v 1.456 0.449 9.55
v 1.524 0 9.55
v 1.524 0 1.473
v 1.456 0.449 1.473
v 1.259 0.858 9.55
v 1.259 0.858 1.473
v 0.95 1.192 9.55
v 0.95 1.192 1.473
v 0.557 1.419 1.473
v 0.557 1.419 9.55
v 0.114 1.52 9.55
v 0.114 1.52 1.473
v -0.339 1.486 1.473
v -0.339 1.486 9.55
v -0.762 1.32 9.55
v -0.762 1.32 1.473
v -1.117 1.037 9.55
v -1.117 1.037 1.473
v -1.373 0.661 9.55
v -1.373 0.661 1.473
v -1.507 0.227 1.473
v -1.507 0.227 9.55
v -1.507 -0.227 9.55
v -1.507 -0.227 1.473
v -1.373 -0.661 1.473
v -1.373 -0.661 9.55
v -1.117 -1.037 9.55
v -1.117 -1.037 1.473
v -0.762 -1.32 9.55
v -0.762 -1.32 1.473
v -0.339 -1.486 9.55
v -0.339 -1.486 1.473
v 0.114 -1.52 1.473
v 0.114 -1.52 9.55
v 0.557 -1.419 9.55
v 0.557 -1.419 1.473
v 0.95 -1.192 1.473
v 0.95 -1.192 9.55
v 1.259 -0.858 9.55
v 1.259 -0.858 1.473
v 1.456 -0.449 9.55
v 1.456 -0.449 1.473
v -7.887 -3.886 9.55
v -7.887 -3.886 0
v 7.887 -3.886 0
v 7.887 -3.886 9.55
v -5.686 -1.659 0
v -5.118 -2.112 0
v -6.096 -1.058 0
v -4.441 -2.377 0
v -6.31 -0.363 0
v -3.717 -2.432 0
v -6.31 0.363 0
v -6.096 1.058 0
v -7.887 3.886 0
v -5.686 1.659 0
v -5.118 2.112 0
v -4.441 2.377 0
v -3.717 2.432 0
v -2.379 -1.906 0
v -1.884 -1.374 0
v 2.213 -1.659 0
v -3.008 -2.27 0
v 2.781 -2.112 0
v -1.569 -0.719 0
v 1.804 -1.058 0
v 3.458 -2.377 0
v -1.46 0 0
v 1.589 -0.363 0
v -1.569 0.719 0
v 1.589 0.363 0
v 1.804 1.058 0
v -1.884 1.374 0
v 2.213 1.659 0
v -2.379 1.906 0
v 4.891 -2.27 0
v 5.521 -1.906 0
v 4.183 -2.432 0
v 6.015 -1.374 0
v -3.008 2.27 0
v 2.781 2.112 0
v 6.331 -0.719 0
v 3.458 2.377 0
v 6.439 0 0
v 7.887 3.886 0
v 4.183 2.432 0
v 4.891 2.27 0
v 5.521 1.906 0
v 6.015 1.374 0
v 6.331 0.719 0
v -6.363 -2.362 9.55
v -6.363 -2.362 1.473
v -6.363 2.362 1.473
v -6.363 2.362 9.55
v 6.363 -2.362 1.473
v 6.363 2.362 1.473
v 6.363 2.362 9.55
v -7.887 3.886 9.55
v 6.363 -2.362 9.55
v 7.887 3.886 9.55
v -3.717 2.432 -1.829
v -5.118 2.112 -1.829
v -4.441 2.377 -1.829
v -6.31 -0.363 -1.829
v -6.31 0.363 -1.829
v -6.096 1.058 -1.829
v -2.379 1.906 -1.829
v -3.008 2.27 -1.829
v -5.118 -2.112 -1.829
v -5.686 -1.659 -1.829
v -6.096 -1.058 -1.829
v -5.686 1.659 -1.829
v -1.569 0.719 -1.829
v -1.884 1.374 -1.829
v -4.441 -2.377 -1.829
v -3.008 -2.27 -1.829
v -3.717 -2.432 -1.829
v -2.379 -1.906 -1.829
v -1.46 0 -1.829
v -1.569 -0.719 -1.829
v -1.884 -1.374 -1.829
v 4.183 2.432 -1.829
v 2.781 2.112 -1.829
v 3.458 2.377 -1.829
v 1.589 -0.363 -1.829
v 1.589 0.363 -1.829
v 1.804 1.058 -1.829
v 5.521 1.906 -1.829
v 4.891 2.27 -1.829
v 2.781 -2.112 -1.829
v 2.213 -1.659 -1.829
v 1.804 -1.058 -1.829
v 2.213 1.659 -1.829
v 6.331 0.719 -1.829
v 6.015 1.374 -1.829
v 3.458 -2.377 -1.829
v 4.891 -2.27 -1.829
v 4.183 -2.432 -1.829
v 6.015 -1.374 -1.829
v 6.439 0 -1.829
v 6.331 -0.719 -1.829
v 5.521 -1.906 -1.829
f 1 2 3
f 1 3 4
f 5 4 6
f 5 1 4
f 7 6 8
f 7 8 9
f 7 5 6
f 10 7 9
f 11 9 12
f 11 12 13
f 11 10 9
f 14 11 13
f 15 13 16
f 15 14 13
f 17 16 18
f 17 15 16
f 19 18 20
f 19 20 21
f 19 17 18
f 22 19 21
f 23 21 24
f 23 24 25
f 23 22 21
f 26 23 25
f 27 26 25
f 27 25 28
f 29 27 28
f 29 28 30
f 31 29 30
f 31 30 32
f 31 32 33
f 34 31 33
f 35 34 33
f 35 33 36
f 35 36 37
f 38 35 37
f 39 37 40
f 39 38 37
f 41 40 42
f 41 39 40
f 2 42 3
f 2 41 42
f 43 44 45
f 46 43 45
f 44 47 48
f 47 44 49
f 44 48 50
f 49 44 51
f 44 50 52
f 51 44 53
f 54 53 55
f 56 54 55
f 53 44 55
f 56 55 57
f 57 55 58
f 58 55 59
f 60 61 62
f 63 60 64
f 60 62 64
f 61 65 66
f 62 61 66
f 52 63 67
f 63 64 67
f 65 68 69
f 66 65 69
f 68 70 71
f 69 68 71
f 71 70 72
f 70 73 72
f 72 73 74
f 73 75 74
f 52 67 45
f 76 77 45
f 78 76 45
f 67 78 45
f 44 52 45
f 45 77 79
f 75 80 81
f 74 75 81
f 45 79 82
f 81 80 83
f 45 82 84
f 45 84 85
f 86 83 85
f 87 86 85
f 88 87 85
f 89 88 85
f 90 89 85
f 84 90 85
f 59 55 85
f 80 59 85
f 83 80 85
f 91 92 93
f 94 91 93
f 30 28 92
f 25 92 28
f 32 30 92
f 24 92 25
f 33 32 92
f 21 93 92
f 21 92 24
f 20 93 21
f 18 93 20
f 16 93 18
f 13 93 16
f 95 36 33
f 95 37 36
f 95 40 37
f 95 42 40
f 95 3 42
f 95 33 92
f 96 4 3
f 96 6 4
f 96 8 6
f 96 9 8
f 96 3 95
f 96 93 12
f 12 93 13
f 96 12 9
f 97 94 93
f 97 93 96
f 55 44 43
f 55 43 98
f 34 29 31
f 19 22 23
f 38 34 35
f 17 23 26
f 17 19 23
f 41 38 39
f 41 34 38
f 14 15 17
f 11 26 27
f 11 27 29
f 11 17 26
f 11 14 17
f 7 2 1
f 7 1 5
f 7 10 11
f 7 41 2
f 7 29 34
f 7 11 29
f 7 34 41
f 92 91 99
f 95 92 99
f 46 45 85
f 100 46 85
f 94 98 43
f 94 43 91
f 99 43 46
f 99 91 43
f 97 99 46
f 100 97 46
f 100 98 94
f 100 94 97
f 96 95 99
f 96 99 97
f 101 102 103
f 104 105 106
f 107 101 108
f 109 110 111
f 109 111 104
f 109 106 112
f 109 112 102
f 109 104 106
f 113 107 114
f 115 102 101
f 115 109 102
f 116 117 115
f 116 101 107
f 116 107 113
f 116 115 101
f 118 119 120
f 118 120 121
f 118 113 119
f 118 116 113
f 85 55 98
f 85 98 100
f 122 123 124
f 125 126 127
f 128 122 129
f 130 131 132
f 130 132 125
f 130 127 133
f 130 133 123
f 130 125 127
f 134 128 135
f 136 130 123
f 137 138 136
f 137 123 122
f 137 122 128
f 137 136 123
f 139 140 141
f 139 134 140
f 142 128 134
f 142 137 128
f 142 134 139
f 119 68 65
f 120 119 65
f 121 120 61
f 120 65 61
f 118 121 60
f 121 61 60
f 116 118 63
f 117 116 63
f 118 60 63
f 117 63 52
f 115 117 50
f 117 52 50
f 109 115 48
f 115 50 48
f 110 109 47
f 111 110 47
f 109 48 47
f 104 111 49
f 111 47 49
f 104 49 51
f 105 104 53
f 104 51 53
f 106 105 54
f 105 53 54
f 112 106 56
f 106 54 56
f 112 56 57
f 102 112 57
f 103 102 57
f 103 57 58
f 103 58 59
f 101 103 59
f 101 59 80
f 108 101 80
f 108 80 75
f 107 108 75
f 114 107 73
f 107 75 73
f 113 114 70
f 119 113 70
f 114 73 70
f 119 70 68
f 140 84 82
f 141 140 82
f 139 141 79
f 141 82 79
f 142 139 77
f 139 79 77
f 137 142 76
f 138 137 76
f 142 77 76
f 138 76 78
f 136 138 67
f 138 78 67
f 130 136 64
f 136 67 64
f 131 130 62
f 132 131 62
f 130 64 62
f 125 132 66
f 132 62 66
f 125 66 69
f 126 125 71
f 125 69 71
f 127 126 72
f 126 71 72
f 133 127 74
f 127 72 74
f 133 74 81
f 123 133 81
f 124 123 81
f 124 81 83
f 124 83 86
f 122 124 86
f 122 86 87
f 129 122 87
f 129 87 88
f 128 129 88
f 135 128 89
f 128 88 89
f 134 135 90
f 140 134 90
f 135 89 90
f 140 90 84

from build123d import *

# Parameters (mm, degrees)
F0_W     = 15.7734
F0_H     = 7.7724
F1_DEPTH = 9.5504
F3_W     = 12.7254
F3_H     = 4.7244
F3_R     = 1.524
F4_DEPTH = 8.0772
F5_R     = 2.4384
F6_DEPTH = 1.8288


with BuildPart() as f1:
    # F0 (on Top) → F1 (new body)
    with BuildSketch(Plane.XY):
        Rectangle(F0_W, F0_H)
    extrude(amount=F1_DEPTH)

    # F3 (on face) → F4 (cut)
    with BuildSketch(Plane.XY.offset(9.5504)):
        Rectangle(F3_W, F3_H)
        Circle(F3_R, mode=Mode.SUBTRACT)
    extrude(amount=-F4_DEPTH, mode=Mode.SUBTRACT)

    # F5 (on face) → F6 (join)
    with BuildSketch(Plane(origin=(0, 0, 0), x_dir=(1, 0, 0), z_dir=(0, 0, -1))):
        with Locations((-3.8989, 0)):
            Circle(F5_R)
        with Locations((4.0005, 0)):
            Circle(F5_R)
    extrude(amount=F6_DEPTH)


solid = f1.part
